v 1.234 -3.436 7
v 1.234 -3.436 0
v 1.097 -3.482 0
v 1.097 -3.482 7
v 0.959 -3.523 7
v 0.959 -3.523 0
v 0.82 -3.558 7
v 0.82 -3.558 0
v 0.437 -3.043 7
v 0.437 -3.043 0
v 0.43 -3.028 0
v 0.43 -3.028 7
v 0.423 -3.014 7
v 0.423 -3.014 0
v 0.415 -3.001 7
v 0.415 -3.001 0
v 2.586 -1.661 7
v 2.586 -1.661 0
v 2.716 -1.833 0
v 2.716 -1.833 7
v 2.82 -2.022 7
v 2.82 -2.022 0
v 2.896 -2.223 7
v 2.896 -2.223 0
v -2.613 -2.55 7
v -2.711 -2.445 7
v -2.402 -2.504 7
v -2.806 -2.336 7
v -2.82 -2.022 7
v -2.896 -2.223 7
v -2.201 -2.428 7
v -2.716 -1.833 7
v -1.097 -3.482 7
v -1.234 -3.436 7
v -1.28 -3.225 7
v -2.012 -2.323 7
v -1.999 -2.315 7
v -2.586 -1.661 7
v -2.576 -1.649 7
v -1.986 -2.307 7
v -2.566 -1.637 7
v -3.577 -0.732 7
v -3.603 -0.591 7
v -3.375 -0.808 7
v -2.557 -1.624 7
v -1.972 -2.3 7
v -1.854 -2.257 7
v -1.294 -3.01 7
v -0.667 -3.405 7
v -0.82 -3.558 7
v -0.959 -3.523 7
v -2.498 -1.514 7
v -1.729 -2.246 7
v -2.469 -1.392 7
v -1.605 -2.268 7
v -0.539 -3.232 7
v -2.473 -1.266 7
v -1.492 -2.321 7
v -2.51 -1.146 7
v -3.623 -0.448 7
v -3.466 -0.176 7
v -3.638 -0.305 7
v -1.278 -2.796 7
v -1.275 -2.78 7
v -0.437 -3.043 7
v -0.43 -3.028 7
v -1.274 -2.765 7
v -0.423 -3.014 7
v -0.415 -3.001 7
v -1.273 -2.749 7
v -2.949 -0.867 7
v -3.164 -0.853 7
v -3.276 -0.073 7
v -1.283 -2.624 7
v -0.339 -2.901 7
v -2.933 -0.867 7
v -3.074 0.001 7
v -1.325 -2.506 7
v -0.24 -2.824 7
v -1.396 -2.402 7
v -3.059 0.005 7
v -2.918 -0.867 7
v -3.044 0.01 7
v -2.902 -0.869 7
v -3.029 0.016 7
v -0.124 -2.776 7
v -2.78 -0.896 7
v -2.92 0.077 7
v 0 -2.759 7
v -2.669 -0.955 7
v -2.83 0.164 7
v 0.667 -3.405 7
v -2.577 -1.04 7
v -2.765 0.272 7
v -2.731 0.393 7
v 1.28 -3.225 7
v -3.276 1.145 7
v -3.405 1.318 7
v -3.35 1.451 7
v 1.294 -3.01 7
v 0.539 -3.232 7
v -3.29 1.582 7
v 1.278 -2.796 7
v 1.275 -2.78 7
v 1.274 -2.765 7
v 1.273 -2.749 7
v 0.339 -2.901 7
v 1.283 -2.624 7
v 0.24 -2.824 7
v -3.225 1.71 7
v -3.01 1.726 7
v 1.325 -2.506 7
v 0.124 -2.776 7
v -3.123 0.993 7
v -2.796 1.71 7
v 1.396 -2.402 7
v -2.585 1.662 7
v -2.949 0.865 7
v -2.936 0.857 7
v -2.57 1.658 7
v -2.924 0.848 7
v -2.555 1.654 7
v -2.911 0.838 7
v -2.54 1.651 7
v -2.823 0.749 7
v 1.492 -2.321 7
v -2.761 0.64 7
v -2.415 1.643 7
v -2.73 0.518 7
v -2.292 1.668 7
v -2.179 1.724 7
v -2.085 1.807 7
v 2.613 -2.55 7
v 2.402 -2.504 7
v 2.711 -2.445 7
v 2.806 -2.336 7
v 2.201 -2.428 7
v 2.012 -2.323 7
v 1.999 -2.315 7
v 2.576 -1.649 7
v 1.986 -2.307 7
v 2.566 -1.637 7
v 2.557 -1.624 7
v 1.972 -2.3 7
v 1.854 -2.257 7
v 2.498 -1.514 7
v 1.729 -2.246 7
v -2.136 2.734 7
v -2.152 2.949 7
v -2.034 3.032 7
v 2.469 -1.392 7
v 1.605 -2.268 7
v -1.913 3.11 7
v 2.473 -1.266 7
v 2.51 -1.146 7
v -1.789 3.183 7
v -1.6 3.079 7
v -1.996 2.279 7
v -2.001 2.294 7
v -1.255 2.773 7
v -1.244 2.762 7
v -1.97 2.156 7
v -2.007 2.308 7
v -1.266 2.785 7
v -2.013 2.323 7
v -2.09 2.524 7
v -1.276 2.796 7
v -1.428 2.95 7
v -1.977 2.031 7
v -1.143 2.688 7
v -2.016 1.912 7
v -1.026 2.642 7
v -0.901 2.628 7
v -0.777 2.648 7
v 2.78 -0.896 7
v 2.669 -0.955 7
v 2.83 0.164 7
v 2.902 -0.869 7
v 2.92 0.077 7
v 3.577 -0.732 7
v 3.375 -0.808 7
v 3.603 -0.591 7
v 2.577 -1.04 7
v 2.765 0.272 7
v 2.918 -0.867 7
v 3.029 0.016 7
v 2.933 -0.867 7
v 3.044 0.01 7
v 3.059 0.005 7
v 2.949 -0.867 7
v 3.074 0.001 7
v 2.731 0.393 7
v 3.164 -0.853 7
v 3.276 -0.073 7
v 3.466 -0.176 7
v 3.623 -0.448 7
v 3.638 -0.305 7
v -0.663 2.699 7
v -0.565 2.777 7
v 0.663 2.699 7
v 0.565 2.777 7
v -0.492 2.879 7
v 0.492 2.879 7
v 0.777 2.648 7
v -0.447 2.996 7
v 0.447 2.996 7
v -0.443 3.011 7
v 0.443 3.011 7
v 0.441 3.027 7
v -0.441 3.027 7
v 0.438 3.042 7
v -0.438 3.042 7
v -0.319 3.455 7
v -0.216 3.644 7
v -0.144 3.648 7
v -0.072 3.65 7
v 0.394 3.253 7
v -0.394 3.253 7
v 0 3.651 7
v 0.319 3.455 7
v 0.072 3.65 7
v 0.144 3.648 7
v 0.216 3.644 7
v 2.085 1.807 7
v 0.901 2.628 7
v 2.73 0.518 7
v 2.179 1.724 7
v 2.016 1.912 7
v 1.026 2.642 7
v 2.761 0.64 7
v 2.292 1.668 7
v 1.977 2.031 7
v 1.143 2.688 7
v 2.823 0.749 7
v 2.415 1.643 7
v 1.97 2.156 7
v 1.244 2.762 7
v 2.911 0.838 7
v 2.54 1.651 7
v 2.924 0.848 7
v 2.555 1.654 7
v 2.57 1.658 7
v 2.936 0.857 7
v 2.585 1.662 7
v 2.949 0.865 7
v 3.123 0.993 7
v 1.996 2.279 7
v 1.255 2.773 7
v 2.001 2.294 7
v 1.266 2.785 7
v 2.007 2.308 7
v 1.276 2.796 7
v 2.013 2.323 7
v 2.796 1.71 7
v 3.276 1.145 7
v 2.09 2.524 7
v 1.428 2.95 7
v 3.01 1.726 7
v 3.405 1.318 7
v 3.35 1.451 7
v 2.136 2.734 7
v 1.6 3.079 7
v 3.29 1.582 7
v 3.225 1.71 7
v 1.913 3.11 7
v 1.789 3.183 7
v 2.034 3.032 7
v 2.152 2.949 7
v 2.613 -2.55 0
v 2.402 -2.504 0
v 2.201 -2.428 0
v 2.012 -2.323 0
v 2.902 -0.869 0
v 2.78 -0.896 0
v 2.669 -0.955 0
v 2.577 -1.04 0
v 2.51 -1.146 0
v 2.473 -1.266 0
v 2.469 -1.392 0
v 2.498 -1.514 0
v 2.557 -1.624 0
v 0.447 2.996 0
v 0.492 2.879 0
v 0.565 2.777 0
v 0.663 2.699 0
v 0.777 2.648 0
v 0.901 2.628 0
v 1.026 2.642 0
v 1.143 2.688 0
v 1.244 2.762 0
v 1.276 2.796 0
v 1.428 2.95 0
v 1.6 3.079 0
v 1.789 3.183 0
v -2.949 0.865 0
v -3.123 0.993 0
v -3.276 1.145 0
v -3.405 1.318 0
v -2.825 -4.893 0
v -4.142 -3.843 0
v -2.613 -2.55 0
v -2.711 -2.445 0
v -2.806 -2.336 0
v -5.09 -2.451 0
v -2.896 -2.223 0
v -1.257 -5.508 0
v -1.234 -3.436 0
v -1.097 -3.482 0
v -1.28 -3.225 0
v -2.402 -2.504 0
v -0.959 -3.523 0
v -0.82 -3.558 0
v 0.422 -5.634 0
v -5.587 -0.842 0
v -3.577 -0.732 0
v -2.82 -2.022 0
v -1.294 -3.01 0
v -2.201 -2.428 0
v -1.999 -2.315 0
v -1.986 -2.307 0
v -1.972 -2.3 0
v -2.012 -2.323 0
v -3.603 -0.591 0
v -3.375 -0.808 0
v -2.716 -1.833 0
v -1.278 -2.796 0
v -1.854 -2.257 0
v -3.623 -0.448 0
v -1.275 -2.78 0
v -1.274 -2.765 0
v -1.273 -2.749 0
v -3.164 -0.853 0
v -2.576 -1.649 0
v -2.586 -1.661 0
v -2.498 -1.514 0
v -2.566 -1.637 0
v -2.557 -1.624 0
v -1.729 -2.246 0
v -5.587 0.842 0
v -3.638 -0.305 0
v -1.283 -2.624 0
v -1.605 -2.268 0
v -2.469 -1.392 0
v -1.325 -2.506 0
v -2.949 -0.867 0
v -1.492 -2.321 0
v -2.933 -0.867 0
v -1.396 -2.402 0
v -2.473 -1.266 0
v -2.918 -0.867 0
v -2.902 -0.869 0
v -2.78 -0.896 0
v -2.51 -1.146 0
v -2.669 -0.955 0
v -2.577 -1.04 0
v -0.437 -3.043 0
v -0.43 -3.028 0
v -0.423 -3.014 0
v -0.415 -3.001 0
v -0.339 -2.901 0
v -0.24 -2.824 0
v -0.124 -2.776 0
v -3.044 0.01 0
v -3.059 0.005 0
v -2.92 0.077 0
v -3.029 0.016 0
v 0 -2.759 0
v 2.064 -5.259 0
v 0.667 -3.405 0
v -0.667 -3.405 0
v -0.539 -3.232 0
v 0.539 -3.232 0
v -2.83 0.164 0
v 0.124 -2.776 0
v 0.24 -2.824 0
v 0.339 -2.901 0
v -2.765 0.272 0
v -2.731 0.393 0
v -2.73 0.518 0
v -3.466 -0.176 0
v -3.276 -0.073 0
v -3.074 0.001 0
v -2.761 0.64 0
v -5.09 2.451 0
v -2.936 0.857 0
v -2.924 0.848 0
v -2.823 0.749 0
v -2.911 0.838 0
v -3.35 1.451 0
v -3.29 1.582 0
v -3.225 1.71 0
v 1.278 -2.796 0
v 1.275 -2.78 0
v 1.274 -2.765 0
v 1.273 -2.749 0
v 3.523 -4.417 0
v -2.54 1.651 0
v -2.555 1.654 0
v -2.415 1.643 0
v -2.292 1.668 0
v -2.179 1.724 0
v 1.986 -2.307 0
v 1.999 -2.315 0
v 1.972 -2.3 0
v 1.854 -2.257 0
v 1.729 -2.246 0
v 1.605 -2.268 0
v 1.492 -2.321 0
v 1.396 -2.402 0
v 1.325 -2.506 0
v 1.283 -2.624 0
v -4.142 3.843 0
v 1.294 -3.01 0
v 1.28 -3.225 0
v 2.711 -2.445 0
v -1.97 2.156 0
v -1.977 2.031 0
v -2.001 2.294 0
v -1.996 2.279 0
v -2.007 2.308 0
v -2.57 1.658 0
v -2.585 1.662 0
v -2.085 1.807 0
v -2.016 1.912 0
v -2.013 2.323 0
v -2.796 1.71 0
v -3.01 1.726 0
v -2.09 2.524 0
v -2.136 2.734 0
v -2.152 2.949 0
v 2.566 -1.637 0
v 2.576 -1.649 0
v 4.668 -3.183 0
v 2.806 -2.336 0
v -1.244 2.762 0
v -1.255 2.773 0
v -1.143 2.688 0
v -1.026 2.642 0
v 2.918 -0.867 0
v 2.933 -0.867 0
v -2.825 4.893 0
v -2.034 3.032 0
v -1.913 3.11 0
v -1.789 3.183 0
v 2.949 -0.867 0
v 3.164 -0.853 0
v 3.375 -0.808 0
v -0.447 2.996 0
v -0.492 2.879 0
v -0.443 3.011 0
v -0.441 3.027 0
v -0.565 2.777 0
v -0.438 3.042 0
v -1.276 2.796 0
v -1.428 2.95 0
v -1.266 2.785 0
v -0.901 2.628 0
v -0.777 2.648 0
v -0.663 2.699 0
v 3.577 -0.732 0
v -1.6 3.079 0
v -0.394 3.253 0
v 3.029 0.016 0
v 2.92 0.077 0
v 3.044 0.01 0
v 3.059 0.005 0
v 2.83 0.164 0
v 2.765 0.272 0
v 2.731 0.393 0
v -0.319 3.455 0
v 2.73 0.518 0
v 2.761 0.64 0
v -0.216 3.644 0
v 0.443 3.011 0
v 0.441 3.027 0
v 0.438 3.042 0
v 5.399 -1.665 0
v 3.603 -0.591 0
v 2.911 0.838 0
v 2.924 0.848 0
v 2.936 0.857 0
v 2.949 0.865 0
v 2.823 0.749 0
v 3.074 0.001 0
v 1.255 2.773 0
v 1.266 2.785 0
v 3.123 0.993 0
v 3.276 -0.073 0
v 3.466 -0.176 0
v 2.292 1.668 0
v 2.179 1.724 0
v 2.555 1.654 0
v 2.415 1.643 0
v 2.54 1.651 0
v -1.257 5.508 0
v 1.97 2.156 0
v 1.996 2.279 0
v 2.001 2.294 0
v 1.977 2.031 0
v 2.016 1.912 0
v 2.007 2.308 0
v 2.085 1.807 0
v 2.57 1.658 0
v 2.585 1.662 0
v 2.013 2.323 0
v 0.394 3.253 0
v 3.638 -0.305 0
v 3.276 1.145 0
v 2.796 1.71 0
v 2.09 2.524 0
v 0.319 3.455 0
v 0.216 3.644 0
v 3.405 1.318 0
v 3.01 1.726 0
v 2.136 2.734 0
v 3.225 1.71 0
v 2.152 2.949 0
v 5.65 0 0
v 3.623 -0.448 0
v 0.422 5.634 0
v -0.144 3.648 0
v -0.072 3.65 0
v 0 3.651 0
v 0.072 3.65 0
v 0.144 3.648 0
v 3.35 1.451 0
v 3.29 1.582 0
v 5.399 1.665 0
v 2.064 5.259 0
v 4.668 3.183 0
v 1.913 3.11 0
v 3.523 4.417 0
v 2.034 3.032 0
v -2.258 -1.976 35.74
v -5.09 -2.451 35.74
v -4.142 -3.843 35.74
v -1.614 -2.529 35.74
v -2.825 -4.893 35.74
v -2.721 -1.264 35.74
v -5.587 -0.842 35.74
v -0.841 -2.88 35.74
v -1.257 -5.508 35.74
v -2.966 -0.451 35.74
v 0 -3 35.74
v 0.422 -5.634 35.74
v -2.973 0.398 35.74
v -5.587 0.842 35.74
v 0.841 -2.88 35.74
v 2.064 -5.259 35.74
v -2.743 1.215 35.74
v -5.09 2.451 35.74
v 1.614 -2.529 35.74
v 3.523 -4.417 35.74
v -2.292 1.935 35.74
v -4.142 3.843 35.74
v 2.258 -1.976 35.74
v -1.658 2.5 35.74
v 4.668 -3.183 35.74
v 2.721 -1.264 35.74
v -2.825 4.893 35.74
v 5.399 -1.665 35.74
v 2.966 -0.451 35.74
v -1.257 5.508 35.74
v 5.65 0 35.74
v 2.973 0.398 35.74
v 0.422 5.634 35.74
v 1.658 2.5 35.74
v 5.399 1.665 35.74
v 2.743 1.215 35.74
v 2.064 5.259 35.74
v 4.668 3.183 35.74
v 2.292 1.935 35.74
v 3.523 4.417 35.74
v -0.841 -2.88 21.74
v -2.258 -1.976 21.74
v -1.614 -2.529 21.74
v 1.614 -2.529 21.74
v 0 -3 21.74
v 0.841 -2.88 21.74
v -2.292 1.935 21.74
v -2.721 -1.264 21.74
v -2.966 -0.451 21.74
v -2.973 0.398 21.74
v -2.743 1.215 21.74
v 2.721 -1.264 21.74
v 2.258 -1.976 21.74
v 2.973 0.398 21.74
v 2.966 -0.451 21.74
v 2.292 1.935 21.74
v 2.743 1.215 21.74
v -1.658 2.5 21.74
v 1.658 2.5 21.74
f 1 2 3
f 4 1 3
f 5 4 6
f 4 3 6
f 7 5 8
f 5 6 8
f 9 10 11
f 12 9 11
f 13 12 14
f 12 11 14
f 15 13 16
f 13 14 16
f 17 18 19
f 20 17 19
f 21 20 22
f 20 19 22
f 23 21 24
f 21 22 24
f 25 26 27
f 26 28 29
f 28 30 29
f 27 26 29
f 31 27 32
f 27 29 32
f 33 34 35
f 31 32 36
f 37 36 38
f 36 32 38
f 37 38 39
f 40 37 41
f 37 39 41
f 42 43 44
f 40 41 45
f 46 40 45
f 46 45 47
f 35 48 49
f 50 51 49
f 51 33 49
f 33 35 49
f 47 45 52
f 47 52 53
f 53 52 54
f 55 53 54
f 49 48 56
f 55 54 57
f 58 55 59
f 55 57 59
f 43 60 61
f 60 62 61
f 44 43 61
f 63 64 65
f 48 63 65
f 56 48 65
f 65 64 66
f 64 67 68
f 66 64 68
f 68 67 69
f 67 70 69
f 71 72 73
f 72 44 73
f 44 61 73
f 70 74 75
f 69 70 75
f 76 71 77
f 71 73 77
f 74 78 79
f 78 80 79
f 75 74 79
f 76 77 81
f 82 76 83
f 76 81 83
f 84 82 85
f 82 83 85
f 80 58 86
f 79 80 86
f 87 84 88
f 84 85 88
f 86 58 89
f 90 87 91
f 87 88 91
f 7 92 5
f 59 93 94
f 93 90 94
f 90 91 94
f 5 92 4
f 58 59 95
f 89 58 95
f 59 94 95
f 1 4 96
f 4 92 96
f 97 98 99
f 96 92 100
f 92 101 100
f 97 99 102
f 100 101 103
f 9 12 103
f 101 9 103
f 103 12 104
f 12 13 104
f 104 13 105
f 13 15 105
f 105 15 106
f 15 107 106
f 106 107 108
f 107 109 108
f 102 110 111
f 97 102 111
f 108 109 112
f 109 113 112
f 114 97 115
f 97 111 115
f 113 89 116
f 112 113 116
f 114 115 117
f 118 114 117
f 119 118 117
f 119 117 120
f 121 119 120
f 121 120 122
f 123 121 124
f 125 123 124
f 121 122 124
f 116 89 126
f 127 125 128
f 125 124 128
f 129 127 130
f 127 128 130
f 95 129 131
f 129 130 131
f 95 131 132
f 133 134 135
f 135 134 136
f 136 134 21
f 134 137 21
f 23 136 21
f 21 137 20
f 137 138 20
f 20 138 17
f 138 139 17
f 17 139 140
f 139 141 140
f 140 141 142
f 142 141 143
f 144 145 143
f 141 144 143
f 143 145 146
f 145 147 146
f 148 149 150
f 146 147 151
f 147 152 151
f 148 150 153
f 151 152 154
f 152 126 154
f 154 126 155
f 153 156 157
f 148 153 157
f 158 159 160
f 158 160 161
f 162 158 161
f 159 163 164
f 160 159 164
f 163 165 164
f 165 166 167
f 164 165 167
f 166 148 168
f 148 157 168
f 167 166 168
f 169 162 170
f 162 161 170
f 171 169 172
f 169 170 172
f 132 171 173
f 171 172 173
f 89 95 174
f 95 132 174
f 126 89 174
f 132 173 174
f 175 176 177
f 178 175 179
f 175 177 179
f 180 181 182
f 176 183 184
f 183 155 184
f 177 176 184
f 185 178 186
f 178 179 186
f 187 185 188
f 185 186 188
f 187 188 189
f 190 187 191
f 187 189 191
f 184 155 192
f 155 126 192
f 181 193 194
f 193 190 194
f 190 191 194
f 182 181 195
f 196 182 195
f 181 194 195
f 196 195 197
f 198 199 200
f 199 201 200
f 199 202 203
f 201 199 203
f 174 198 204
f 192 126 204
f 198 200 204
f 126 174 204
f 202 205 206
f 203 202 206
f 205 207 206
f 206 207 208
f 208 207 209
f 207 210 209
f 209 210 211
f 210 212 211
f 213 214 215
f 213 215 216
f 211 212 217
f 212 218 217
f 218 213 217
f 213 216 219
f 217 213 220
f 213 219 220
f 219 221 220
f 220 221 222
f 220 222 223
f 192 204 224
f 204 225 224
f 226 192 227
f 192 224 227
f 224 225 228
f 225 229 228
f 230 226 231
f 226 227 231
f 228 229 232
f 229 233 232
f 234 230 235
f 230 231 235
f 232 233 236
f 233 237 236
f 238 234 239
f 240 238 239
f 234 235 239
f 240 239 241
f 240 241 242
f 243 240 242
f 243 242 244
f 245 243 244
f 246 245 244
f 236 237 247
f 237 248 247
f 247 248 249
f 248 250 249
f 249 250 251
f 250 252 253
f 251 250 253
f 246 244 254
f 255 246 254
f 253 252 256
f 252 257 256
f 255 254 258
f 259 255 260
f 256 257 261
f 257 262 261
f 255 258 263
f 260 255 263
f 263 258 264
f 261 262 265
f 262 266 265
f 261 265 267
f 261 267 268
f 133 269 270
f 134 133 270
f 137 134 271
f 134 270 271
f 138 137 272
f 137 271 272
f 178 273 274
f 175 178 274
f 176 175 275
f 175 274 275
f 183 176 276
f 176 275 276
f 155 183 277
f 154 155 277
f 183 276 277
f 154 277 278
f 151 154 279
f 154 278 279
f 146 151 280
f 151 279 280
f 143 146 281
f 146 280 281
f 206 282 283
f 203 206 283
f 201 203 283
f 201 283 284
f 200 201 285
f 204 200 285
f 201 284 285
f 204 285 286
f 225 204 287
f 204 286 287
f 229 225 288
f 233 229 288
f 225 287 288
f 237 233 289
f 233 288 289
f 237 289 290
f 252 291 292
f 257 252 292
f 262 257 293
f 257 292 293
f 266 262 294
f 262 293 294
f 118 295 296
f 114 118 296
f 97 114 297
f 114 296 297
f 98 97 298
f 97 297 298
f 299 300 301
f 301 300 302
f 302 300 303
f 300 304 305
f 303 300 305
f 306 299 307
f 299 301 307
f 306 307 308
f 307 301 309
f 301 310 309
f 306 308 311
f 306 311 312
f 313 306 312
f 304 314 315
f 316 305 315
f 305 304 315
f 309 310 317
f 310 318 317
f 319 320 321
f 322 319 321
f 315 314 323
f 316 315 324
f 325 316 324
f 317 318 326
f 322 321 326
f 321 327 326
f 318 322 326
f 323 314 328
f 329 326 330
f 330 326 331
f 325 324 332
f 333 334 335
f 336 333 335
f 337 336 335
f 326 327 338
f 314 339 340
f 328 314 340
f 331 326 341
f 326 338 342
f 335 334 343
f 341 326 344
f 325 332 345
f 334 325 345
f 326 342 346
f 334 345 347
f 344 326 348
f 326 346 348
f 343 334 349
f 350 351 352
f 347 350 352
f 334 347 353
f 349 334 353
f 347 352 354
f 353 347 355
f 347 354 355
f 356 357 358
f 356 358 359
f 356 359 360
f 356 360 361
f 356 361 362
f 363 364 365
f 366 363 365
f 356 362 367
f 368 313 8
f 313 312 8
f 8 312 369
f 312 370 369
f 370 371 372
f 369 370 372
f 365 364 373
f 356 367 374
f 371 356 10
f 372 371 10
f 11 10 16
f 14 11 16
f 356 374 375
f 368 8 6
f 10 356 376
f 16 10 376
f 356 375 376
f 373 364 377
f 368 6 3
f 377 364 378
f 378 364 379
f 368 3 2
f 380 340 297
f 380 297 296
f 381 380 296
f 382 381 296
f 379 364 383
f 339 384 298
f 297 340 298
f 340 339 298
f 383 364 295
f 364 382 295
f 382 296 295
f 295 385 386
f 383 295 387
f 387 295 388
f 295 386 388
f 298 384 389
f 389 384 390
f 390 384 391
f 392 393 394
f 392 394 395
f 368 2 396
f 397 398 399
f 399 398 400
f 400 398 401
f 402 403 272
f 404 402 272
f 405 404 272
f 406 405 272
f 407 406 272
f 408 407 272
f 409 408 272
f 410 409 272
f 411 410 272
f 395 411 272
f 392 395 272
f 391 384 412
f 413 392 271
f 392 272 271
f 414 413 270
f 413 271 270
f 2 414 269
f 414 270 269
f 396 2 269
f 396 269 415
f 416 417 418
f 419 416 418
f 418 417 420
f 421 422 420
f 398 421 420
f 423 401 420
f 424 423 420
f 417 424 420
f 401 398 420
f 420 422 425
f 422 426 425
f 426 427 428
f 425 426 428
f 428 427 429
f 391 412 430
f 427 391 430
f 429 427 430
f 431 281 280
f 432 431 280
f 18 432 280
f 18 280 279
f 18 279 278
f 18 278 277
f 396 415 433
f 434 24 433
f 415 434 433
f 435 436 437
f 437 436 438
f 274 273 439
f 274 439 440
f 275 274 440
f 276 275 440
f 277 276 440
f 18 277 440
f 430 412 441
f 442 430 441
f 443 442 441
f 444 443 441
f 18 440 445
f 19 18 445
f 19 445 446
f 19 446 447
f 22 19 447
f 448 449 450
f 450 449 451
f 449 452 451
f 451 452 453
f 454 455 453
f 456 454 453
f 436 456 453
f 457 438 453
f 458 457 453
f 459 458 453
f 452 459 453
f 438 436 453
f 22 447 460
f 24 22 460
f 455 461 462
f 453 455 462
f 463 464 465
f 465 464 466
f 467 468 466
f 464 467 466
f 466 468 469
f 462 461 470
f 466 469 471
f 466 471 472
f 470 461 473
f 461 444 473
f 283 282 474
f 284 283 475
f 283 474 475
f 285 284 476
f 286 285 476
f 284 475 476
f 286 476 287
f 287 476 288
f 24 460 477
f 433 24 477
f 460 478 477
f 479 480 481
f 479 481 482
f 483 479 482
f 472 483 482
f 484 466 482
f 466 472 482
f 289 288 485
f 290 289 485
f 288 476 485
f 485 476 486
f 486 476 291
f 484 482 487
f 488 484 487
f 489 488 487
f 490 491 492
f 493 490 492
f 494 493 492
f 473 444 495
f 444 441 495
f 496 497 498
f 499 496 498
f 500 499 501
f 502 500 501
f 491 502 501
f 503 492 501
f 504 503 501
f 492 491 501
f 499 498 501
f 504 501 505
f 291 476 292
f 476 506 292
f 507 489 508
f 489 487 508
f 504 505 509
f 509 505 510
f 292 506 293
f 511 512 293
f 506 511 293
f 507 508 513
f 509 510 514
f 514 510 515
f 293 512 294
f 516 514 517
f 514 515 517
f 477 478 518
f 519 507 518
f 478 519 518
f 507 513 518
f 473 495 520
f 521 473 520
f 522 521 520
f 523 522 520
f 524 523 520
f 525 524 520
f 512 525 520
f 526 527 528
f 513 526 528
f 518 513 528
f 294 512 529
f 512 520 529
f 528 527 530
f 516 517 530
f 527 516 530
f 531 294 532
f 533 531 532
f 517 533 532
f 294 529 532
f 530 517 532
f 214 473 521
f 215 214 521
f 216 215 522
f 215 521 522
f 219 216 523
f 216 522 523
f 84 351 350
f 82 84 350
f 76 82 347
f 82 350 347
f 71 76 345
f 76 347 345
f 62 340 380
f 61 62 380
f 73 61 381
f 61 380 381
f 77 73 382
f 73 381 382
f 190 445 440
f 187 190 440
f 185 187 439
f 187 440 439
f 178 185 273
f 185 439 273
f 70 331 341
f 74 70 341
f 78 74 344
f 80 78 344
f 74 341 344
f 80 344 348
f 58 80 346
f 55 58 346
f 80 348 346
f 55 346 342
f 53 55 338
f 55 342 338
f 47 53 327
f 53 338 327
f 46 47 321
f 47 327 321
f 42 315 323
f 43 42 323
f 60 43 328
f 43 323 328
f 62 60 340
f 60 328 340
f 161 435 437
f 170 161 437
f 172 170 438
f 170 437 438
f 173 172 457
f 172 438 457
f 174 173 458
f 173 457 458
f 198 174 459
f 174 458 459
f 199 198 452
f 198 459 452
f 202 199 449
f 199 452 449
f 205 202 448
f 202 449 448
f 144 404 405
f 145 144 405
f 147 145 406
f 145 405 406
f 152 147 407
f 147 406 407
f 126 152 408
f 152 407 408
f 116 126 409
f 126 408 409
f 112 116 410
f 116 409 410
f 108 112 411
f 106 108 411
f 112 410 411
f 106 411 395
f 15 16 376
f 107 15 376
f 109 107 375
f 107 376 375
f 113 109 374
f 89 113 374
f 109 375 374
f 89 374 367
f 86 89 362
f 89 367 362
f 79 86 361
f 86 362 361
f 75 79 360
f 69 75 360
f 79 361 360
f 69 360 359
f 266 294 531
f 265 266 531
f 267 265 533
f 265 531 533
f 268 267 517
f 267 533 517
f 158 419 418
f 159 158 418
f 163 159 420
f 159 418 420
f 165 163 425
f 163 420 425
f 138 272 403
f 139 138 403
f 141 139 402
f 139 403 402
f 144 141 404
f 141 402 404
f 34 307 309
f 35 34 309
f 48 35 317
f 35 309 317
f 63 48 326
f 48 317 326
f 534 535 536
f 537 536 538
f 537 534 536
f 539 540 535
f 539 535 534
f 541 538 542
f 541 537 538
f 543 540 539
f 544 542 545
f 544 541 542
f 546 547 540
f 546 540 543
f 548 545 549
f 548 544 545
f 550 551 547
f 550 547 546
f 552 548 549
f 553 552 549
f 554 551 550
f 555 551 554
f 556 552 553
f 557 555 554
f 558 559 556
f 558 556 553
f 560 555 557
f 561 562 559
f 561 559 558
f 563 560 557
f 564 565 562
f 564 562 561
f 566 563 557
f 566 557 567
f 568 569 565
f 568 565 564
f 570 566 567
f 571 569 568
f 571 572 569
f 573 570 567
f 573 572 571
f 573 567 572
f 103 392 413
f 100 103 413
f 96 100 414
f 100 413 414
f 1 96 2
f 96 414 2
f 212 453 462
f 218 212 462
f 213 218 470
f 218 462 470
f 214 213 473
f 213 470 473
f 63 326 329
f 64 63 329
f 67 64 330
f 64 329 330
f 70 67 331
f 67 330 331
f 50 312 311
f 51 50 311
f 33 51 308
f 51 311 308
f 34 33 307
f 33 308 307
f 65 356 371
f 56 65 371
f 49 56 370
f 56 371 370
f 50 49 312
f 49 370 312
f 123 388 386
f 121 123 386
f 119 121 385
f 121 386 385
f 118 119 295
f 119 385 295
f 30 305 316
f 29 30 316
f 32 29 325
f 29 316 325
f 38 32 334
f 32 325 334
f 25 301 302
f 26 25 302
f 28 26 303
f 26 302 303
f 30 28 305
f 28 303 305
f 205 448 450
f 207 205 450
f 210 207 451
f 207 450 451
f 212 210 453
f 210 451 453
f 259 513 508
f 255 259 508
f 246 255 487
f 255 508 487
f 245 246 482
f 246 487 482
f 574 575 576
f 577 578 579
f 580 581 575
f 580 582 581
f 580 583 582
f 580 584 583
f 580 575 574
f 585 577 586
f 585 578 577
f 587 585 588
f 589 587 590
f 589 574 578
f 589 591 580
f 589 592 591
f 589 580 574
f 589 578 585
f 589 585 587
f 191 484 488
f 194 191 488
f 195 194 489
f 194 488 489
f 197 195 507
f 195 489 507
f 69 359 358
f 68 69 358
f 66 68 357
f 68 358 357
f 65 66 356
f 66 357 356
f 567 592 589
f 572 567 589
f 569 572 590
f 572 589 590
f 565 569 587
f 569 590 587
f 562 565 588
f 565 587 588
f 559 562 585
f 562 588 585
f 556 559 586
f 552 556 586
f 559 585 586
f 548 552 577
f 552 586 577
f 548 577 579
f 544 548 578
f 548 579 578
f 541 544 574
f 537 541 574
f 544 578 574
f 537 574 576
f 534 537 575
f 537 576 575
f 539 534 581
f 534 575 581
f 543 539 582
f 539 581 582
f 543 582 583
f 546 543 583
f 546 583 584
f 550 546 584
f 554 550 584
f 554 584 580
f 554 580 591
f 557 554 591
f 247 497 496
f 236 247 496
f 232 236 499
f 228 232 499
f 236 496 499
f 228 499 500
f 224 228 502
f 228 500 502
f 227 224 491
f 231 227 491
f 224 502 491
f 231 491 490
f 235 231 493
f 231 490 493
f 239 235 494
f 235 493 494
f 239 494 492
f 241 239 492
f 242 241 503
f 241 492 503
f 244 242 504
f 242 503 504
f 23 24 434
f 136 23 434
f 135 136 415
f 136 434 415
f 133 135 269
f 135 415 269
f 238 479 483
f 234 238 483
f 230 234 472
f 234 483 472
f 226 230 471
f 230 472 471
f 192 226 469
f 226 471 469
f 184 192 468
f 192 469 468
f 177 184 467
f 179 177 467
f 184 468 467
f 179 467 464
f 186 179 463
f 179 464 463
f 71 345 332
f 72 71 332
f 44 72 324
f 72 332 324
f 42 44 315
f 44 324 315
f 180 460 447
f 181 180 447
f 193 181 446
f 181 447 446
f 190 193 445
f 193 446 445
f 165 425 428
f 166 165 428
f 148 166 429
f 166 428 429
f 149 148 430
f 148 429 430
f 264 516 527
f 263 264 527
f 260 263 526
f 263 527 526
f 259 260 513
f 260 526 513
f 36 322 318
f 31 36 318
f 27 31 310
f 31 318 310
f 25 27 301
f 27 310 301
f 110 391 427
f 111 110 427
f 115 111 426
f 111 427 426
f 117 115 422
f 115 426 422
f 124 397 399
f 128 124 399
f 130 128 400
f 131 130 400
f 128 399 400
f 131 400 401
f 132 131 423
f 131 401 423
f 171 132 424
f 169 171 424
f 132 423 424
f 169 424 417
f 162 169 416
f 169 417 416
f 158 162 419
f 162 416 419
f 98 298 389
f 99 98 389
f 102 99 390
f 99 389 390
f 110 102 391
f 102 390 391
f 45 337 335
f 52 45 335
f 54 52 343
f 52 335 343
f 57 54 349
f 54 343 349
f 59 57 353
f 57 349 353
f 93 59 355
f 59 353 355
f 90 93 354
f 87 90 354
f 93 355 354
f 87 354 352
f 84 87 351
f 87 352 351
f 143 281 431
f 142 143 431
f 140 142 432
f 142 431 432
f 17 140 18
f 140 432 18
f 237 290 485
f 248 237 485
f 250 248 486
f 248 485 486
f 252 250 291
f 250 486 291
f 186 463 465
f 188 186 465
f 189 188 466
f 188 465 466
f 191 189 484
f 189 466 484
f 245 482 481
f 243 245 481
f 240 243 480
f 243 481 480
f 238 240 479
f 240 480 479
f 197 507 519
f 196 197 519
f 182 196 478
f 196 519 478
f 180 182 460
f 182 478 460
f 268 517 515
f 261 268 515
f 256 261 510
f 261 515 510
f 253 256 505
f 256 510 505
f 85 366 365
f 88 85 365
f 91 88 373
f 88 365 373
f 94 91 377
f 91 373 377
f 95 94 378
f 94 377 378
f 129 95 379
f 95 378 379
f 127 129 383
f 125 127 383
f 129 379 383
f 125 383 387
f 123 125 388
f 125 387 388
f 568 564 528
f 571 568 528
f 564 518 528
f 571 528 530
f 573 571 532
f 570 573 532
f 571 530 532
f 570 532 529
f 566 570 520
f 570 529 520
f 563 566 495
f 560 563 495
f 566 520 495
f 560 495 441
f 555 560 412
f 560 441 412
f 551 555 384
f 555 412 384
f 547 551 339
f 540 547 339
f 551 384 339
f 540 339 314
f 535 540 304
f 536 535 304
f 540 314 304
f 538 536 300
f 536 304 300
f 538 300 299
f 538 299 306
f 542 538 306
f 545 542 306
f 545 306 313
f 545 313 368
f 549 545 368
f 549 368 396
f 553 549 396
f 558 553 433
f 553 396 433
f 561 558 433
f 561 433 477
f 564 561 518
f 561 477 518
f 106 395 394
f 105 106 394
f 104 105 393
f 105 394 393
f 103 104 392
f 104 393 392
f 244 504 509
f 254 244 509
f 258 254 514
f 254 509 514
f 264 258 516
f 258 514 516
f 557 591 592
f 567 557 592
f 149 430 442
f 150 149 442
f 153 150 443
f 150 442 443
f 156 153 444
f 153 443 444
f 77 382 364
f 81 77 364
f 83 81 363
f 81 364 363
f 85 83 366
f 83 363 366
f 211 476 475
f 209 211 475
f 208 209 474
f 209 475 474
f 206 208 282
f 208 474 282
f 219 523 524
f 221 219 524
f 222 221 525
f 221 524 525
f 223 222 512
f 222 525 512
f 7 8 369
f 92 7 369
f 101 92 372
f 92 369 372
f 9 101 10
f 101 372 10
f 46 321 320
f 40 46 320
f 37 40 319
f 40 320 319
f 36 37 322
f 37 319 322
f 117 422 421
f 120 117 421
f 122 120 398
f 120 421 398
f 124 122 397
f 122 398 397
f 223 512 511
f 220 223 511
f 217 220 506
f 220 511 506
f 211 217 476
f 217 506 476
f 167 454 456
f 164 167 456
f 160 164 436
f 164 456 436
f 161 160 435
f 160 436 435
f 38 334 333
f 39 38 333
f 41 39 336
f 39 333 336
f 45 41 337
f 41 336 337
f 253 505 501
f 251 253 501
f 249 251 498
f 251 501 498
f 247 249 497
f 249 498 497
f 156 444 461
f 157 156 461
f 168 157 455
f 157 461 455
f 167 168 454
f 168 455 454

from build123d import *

# Parameters (mm, degrees)
SKETCH1_R           = 5.65
BOSS_EXTRUDE1_DEPTH = 7
SKETCH2_R           = 5.65
BOSS_EXTRUDE2_DEPTH = 14.74
SKETCH3_R           = 5.65
BOSS_EXTRUDE3_DEPTH = 14


with BuildPart() as part:
    # Sketch1 → Boss-Extrude1 (new body)
    # profile 1 of 12: a face of its own
    with BuildSketch(Plane.XY):
        Circle(SKETCH1_R)
        with BuildLine():
            ThreePointArc((-0.81964124, -3.557591308), (-1.028546403, -3.50290736), (-1.233852984, -3.435967766))
            ThreePointArc((-1.233852984, -3.435967766), (-1.973766094, -3.071239991), (-2.612905161, -2.549704746))
            ThreePointArc((-2.612905161, -2.549704746), (-2.759082994, -2.390759024), (-2.895607604, -2.223448736))
            ThreePointArc((-2.895607604, -2.223448736), (-3.320875399, -1.516592978), (-3.576590156, -0.732304943))
            ThreePointArc((-3.576590156, -0.732304943), (-3.613630229, -0.519561589), (-3.638027269, -0.305000442))
            ThreePointArc((-3.638027269, -0.305000442), (-3.613630229, 0.519561589), (-3.404733048, 1.317596505))
            ThreePointArc((-3.404733048, 1.317596505), (-3.320875399, 1.516592978), (-3.225398981, 1.710283337))
            ThreePointArc((-3.225398981, 1.710283337), (-2.759082994, 2.390759024), (-2.151897253, 2.949170373))
            ThreePointArc((-2.151897253, 2.949170373), (-1.973766094, 3.071239991), (-1.788729306, 3.182564241))
            ThreePointArc((-1.788729306, 3.182564241), (-1.028546403, 3.50290736), (-0.215849285, 3.644403485))
            ThreePointArc((-0.215849285, 3.644403485), (-0.107971873, 3.649193027), (0, 3.650790007))
            ThreePointArc((0, 3.650790007), (0.107971873, 3.649193027), (0.215849285, 3.644403485))
            ThreePointArc((0.215849285, 3.644403485), (1.028546403, 3.50290736), (1.788729306, 3.182564241))
            ThreePointArc((1.788729306, 3.182564241), (1.973766094, 3.071239991), (2.151897253, 2.949170373))
            ThreePointArc((2.151897253, 2.949170373), (2.759082994, 2.390759024), (3.225398981, 1.710283337))
            ThreePointArc((3.225398981, 1.710283337), (3.320875399, 1.516592978), (3.404733048, 1.317596505))
            ThreePointArc((3.404733048, 1.317596505), (3.588748603, 0.670187395), (3.650790007, 0))
            ThreePointArc((3.650790007, 0), (3.647597927, -0.152633677), (3.638027269, -0.305000442))
            ThreePointArc((3.638027269, -0.305000442), (3.613630229, -0.519561589), (3.576590156, -0.732304943))
            ThreePointArc((3.576590156, -0.732304943), (3.320875399, -1.516592978), (2.895607604, -2.223448736))
            ThreePointArc((2.895607604, -2.223448736), (2.759082994, -2.390759024), (2.612905161, -2.549704746))
            ThreePointArc((2.612905161, -2.549704746), (1.973766094, -3.071239991), (1.233852984, -3.435967766))
            ThreePointArc((1.233852984, -3.435967766), (1.028546403, -3.50290736), (0.81964124, -3.557591308))
            ThreePointArc((0.81964124, -3.557591308), (0, -3.650790007), (-0.81964124, -3.557591308))
        make_face(mode=Mode.SUBTRACT)
    # profile 2 of 12: a face of its own
    with BuildSketch(Plane.XY):
        with BuildLine():
            ThreePointArc((-2.151897253, 2.949170373), (-2.759082994, 2.390759024), (-3.225398981, 1.710283337))
            ThreePointArc((-3.225398981, 1.710283337), (-2.902782795, 1.721509121), (-2.585426091, 1.662416447))
            ThreePointArc((-2.585426091, 1.662416447), (-2.562741672, 1.6561643), (-2.539777266, 1.651035136))
            ThreePointArc((-2.539777266, 1.651035136), (-2.085465777, 1.807066382), (-1.99567797, 2.278959198))
            ThreePointArc((-1.99567797, 2.278959198), (-2.004023102, 2.300959902), (-2.013439941, 2.322523654))
            ThreePointArc((-2.013439941, 2.322523654), (-2.117095704, 2.628240359), (-2.151897253, 2.949170373))
        make_face()
    # profile 3 of 12: a face of its own
    with BuildSketch(Plane.XY):
        with BuildLine():
            ThreePointArc((-0.215849285, 3.644403485), (-1.028546403, 3.50290736), (-1.788729306, 3.182564241))
            ThreePointArc((-1.788729306, 3.182564241), (-1.511258183, 3.017588493), (-1.276228646, 2.796300584))
            ThreePointArc((-1.276228646, 2.796300584), (-1.260525464, 2.77877682), (-1.243979612, 2.762046398))
            ThreePointArc((-1.243979612, 2.762046398), (-0.777431606, 2.6476889), (-0.446772779, 2.996127445))
            ThreePointArc((-0.446772779, 2.996127445), (-0.441898672, 3.019147334), (-0.438162377, 3.042379044))
            ThreePointArc((-0.438162377, 3.042379044), (-0.360080224, 3.355604839), (-0.215849285, 3.644403485))
        make_face()
    # profile 4 of 12: a face of its own
    with BuildSketch(Plane.XY):
        with BuildLine():
            ThreePointArc((1.788729306, 3.182564241), (1.028546403, 3.50290736), (0.215849285, 3.644403485))
            ThreePointArc((0.215849285, 3.644403485), (0.360080224, 3.355604839), (0.438162377, 3.042379044))
            ThreePointArc((0.438162377, 3.042379044), (0.441898672, 3.019147334), (0.446772779, 2.996127445))
            ThreePointArc((0.446772779, 2.996127445), (0.777431606, 2.6476889), (1.243979612, 2.762046398))
            ThreePointArc((1.243979612, 2.762046398), (1.260525464, 2.77877682), (1.276228646, 2.796300584))
            ThreePointArc((1.276228646, 2.796300584), (1.511258183, 3.017588493), (1.788729306, 3.182564241))
        make_face()
    # profile 5 of 12: a face of its own
    with BuildSketch(Plane.XY):
        with BuildLine():
            ThreePointArc((2.585426091, 1.662416447), (2.902782795, 1.721509121), (3.225398981, 1.710283337))
            ThreePointArc((3.225398981, 1.710283337), (2.759082994, 2.390759024), (2.151897253, 2.949170373))
            ThreePointArc((2.151897253, 2.949170373), (2.117095704, 2.628240359), (2.013439941, 2.322523654))
            ThreePointArc((2.013439941, 2.322523654), (2.004023102, 2.300959902), (1.99567797, 2.278959198))
            ThreePointArc((1.99567797, 2.278959198), (2.085465777, 1.807066382), (2.539777266, 1.651035136))
            ThreePointArc((2.539777266, 1.651035136), (2.562741672, 1.6561643), (2.585426091, 1.662416447))
        make_face()
    # profile 6 of 12: a face of its own
    with BuildSketch(Plane.XY):
        with BuildLine():
            ThreePointArc((3.07376902, 0.000726834), (3.372694379, -0.121137234), (3.638027269, -0.305000442))
            ThreePointArc((3.638027269, -0.305000442), (3.647597927, -0.152633677), (3.650790007, 0))
            ThreePointArc((3.650790007, 0), (3.588748603, 0.670187395), (3.404733048, 1.317596505))
            ThreePointArc((3.404733048, 1.317596505), (3.201948257, 1.066428135), (2.94946455, 0.865283413))
            ThreePointArc((2.94946455, 0.865283413), (2.929884357, 0.852233959), (2.910969506, 0.838237507))
            ThreePointArc((2.910969506, 0.838237507), (2.731379298, 0.392713056), (3.029213584, 0.015831883))
            ThreePointArc((3.029213584, 0.015831883), (3.051305506, 0.007731316), (3.07376902, 0.000726834))
        make_face()
    # profile 7 of 12: a face of its own
    with BuildSketch(Plane.XY):
        with BuildLine():
            ThreePointArc((2.586212003, -1.661193544), (2.771799329, -1.925323372), (2.895607604, -2.223448736))
            ThreePointArc((2.895607604, -2.223448736), (3.320875399, -1.516592978), (3.576590156, -0.732304943))
            ThreePointArc((3.576590156, -0.732304943), (3.270204862, -0.833967486), (2.949055004, -0.866678197))
            ThreePointArc((2.949055004, -0.866678197), (2.92552803, -0.867070245), (2.902048792, -0.868618669))
            ThreePointArc((2.902048792, -0.868618669), (2.510099192, -1.146323891), (2.556895991, -1.62439788))
            ThreePointArc((2.556895991, -1.62439788), (2.571101401, -1.643156306), (2.586212003, -1.661193544))
        make_face()
    # profile 8 of 12: a face of its own
    with BuildSketch(Plane.XY):
        with BuildLine():
            ThreePointArc((1.277550948, -2.79569671), (1.290877576, -3.118232944), (1.233852984, -3.435967766))
            ThreePointArc((1.233852984, -3.435967766), (1.973766094, -3.071239991), (2.612905161, -2.549704746))
            ThreePointArc((2.612905161, -2.549704746), (2.300194531, -2.469584323), (2.012341335, -2.323475602))
            ThreePointArc((2.012341335, -2.323475602), (1.992337228, -2.311085771), (1.971748095, -2.299694554))
            ThreePointArc((1.971748095, -2.299694554), (1.491880328, -2.321411101), (1.272781988, -2.748892795))
            ThreePointArc((1.272781988, -2.748892795), (1.274590768, -2.772353412), (1.277550948, -2.79569671))
        make_face()
    # profile 9 of 12: a face of its own
    with BuildSketch(Plane.XY):
        with BuildLine():
            ThreePointArc((-0.436723505, -3.042585922), (-0.599888686, -3.321125588), (-0.81964124, -3.557591308))
            ThreePointArc((-0.81964124, -3.557591308), (0, -3.650790007), (0.81964124, -3.557591308))
            ThreePointArc((0.81964124, -3.557591308), (0.599888686, -3.321125588), (0.436723505, -3.042585922))
            ThreePointArc((0.436723505, -3.042585922), (0.426593428, -3.021347897), (0.415431304, -3.00063367))
            ThreePointArc((0.415431304, -3.00063367), (0, -2.75946669), (-0.415431304, -3.000633669))
            ThreePointArc((-0.415431304, -3.000633669), (-0.426593428, -3.021347896), (-0.436723505, -3.042585922))
        make_face()
    # profile 10 of 12: a face of its own
    with BuildSketch(Plane.XY):
        with BuildLine():
            ThreePointArc((-1.233852984, -3.435967766), (-1.290877576, -3.118232944), (-1.277550949, -2.79569671))
            ThreePointArc((-1.277550949, -2.79569671), (-1.274590768, -2.772353411), (-1.272781988, -2.748892794))
            ThreePointArc((-1.272781988, -2.748892794), (-1.491880327, -2.321411102), (-1.971748091, -2.299694555))
            ThreePointArc((-1.971748091, -2.299694555), (-1.992337225, -2.311085772), (-2.012341332, -2.323475603))
            ThreePointArc((-2.012341332, -2.323475603), (-2.300194529, -2.469584324), (-2.612905161, -2.549704746))
            ThreePointArc((-2.612905161, -2.549704746), (-1.973766094, -3.071239991), (-1.233852984, -3.435967766))
        make_face()
    # profile 11 of 12: a face of its own
    with BuildSketch(Plane.XY):
        with BuildLine():
            ThreePointArc((-3.576590156, -0.732304943), (-3.320875399, -1.516592978), (-2.895607604, -2.223448736))
            ThreePointArc((-2.895607604, -2.223448736), (-2.771799329, -1.925323372), (-2.586212003, -1.661193544))
            ThreePointArc((-2.586212003, -1.661193544), (-2.571101401, -1.643156306), (-2.556895991, -1.62439788))
            ThreePointArc((-2.556895991, -1.62439788), (-2.510099192, -1.146323891), (-2.902048792, -0.868618669))
            ThreePointArc((-2.902048792, -0.868618669), (-2.92552803, -0.867070245), (-2.949055004, -0.866678197))
            ThreePointArc((-2.949055004, -0.866678197), (-3.270204862, -0.833967486), (-3.576590156, -0.732304943))
        make_face()
    # profile 12 of 12: a face of its own
    with BuildSketch(Plane.XY):
        with BuildLine():
            ThreePointArc((-3.404733048, 1.317596505), (-3.613630229, 0.519561589), (-3.638027269, -0.305000442))
            ThreePointArc((-3.638027269, -0.305000442), (-3.372694379, -0.121137234), (-3.07376902, 0.000726834))
            ThreePointArc((-3.07376902, 0.000726834), (-3.051305506, 0.007731316), (-3.029213584, 0.015831883))
            ThreePointArc((-3.029213584, 0.015831883), (-2.731379298, 0.392713056), (-2.910969506, 0.838237507))
            ThreePointArc((-2.910969506, 0.838237507), (-2.929884357, 0.852233959), (-2.94946455, 0.865283413))
            ThreePointArc((-2.94946455, 0.865283413), (-3.201948257, 1.066428135), (-3.404733048, 1.317596505))
        make_face()
    extrude(amount=BOSS_EXTRUDE1_DEPTH)

    # Sketch2 → Boss-Extrude2 (add)
    with BuildSketch(Plane.XY.offset(7)):
        Circle(SKETCH2_R)
    extrude(amount=BOSS_EXTRUDE2_DEPTH)

    # Sketch3 → Boss-Extrude3 (add)
    with BuildSketch(Plane.XY.offset(21.74)):
        Circle(SKETCH3_R)
        with BuildLine():
            Line((-1.658312395, 2.5), (1.658312395, 2.5))
            ThreePointArc((1.658312395, 2.5), (0, -3), (-1.658312395, 2.5))
        make_face(mode=Mode.SUBTRACT)
    extrude(amount=BOSS_EXTRUDE3_DEPTH)


solid = part.part
